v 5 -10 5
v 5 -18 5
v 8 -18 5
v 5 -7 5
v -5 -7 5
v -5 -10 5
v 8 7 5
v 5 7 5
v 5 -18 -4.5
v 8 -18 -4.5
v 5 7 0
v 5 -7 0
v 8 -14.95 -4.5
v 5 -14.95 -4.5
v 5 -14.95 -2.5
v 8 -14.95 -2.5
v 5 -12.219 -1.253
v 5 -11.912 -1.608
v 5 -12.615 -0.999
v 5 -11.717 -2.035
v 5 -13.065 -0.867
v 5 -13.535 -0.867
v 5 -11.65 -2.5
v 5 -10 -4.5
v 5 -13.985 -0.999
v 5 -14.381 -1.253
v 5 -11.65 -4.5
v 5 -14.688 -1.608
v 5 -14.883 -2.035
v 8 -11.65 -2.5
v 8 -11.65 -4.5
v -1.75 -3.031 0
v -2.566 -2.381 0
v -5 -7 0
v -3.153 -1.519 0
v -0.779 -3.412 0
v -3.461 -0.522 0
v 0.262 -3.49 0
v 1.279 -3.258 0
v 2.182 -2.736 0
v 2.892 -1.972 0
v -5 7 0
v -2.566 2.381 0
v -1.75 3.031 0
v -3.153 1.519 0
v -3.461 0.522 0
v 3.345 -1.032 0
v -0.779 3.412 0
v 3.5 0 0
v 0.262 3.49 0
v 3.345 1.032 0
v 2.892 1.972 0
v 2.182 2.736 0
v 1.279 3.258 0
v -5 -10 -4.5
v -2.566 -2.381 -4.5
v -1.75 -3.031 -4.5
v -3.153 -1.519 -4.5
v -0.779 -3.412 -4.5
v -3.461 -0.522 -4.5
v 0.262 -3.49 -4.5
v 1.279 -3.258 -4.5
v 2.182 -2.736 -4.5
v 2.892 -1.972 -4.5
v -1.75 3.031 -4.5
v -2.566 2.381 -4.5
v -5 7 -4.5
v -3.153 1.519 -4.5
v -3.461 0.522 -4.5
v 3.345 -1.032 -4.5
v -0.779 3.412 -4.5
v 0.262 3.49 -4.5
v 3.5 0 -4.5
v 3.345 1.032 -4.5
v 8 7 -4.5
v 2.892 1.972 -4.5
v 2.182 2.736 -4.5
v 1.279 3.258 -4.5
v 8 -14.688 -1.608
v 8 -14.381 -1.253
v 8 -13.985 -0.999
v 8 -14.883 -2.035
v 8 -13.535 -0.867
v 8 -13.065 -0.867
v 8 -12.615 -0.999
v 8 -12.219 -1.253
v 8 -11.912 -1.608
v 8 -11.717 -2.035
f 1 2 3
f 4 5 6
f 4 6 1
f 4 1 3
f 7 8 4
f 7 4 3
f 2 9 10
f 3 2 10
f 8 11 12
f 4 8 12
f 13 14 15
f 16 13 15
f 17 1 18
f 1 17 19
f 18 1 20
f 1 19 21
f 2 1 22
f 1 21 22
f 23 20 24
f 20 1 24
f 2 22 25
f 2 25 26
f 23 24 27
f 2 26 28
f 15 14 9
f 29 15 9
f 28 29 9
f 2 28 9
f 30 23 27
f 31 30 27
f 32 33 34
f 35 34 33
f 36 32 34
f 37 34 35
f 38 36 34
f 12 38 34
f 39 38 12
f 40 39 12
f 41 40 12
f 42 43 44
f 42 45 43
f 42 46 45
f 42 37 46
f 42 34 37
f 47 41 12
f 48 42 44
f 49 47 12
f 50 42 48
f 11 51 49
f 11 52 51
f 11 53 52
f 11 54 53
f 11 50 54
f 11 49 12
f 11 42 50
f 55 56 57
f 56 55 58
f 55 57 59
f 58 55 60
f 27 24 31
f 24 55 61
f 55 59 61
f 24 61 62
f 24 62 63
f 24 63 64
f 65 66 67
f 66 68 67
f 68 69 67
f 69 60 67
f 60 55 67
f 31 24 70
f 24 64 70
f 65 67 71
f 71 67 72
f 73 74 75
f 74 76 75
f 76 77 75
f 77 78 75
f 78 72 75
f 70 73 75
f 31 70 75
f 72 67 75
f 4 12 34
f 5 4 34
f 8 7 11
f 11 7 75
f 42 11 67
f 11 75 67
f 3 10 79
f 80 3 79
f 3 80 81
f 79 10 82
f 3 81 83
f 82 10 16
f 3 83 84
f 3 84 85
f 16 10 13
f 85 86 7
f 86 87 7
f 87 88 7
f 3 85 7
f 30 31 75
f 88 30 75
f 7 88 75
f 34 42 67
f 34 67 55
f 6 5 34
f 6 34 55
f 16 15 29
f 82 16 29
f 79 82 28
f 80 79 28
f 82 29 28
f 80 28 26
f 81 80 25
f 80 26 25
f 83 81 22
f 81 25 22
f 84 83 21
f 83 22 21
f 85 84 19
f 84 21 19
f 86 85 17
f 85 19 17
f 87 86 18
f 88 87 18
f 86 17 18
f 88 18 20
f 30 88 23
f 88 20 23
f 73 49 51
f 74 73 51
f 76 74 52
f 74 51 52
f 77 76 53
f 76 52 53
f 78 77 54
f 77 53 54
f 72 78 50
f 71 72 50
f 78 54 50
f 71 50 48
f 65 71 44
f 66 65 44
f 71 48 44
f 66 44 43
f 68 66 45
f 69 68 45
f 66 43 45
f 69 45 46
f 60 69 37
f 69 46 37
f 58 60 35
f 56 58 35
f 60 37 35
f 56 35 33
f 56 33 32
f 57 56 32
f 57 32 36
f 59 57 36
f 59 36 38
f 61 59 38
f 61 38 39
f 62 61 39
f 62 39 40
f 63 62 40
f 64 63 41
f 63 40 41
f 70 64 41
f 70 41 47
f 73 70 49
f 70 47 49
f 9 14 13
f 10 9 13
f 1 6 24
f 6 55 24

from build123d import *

# Parameters (mm, degrees)
F0_W     = 10
F0_H     = 14
F0_R     = 3.5
F1_DEPTH = 4.5
F2_DEPTH = 5
F4_DEPTH = 25


with BuildPart() as f1:
    # F0 (on Top) → F1 (new body)
    with BuildSketch(Plane.XY):
        Polygon((8, 7), (5, 7), (5, -7), (-5, -7), (-5, -10), (5, -10), (5, -18), (8, -18), align=None)
        Rectangle(F0_W, F0_H)
        Circle(F0_R, mode=Mode.SUBTRACT)
    extrude(amount=-F1_DEPTH)

    # F0 (on Top) → F2 (join)
    with BuildSketch(Plane.XY):
        Polygon((8, 7), (5, 7), (5, -7), (-5, -7), (-5, -10), (5, -10), (5, -18), (8, -18), align=None)
    extrude(amount=F2_DEPTH)

    # F3 (on face) → F4 (cut)
    with BuildSketch(Plane(origin=(5, 0, 0), x_dir=(0, -1, 0), z_dir=(-1, 0, 0))):
        with BuildLine():
            Line((14.95, -4.5), (14.95, -2.5))
            ThreePointArc((14.95, -2.5), (13.3, -4.15), (11.65, -2.5))
            Line((11.65, -2.5), (11.65, -4.5))
            Line((11.65, -4.5), (14.95, -4.5))
        make_face()
        with BuildLine():
            ThreePointArc((11.65, -2.5), (13.3, -4.15), (14.95, -2.5))
            ThreePointArc((14.95, -2.5), (13.3, -0.85), (11.65, -2.5))
        make_face()
    extrude(amount=-F4_DEPTH, mode=Mode.SUBTRACT)


solid = f1.part
